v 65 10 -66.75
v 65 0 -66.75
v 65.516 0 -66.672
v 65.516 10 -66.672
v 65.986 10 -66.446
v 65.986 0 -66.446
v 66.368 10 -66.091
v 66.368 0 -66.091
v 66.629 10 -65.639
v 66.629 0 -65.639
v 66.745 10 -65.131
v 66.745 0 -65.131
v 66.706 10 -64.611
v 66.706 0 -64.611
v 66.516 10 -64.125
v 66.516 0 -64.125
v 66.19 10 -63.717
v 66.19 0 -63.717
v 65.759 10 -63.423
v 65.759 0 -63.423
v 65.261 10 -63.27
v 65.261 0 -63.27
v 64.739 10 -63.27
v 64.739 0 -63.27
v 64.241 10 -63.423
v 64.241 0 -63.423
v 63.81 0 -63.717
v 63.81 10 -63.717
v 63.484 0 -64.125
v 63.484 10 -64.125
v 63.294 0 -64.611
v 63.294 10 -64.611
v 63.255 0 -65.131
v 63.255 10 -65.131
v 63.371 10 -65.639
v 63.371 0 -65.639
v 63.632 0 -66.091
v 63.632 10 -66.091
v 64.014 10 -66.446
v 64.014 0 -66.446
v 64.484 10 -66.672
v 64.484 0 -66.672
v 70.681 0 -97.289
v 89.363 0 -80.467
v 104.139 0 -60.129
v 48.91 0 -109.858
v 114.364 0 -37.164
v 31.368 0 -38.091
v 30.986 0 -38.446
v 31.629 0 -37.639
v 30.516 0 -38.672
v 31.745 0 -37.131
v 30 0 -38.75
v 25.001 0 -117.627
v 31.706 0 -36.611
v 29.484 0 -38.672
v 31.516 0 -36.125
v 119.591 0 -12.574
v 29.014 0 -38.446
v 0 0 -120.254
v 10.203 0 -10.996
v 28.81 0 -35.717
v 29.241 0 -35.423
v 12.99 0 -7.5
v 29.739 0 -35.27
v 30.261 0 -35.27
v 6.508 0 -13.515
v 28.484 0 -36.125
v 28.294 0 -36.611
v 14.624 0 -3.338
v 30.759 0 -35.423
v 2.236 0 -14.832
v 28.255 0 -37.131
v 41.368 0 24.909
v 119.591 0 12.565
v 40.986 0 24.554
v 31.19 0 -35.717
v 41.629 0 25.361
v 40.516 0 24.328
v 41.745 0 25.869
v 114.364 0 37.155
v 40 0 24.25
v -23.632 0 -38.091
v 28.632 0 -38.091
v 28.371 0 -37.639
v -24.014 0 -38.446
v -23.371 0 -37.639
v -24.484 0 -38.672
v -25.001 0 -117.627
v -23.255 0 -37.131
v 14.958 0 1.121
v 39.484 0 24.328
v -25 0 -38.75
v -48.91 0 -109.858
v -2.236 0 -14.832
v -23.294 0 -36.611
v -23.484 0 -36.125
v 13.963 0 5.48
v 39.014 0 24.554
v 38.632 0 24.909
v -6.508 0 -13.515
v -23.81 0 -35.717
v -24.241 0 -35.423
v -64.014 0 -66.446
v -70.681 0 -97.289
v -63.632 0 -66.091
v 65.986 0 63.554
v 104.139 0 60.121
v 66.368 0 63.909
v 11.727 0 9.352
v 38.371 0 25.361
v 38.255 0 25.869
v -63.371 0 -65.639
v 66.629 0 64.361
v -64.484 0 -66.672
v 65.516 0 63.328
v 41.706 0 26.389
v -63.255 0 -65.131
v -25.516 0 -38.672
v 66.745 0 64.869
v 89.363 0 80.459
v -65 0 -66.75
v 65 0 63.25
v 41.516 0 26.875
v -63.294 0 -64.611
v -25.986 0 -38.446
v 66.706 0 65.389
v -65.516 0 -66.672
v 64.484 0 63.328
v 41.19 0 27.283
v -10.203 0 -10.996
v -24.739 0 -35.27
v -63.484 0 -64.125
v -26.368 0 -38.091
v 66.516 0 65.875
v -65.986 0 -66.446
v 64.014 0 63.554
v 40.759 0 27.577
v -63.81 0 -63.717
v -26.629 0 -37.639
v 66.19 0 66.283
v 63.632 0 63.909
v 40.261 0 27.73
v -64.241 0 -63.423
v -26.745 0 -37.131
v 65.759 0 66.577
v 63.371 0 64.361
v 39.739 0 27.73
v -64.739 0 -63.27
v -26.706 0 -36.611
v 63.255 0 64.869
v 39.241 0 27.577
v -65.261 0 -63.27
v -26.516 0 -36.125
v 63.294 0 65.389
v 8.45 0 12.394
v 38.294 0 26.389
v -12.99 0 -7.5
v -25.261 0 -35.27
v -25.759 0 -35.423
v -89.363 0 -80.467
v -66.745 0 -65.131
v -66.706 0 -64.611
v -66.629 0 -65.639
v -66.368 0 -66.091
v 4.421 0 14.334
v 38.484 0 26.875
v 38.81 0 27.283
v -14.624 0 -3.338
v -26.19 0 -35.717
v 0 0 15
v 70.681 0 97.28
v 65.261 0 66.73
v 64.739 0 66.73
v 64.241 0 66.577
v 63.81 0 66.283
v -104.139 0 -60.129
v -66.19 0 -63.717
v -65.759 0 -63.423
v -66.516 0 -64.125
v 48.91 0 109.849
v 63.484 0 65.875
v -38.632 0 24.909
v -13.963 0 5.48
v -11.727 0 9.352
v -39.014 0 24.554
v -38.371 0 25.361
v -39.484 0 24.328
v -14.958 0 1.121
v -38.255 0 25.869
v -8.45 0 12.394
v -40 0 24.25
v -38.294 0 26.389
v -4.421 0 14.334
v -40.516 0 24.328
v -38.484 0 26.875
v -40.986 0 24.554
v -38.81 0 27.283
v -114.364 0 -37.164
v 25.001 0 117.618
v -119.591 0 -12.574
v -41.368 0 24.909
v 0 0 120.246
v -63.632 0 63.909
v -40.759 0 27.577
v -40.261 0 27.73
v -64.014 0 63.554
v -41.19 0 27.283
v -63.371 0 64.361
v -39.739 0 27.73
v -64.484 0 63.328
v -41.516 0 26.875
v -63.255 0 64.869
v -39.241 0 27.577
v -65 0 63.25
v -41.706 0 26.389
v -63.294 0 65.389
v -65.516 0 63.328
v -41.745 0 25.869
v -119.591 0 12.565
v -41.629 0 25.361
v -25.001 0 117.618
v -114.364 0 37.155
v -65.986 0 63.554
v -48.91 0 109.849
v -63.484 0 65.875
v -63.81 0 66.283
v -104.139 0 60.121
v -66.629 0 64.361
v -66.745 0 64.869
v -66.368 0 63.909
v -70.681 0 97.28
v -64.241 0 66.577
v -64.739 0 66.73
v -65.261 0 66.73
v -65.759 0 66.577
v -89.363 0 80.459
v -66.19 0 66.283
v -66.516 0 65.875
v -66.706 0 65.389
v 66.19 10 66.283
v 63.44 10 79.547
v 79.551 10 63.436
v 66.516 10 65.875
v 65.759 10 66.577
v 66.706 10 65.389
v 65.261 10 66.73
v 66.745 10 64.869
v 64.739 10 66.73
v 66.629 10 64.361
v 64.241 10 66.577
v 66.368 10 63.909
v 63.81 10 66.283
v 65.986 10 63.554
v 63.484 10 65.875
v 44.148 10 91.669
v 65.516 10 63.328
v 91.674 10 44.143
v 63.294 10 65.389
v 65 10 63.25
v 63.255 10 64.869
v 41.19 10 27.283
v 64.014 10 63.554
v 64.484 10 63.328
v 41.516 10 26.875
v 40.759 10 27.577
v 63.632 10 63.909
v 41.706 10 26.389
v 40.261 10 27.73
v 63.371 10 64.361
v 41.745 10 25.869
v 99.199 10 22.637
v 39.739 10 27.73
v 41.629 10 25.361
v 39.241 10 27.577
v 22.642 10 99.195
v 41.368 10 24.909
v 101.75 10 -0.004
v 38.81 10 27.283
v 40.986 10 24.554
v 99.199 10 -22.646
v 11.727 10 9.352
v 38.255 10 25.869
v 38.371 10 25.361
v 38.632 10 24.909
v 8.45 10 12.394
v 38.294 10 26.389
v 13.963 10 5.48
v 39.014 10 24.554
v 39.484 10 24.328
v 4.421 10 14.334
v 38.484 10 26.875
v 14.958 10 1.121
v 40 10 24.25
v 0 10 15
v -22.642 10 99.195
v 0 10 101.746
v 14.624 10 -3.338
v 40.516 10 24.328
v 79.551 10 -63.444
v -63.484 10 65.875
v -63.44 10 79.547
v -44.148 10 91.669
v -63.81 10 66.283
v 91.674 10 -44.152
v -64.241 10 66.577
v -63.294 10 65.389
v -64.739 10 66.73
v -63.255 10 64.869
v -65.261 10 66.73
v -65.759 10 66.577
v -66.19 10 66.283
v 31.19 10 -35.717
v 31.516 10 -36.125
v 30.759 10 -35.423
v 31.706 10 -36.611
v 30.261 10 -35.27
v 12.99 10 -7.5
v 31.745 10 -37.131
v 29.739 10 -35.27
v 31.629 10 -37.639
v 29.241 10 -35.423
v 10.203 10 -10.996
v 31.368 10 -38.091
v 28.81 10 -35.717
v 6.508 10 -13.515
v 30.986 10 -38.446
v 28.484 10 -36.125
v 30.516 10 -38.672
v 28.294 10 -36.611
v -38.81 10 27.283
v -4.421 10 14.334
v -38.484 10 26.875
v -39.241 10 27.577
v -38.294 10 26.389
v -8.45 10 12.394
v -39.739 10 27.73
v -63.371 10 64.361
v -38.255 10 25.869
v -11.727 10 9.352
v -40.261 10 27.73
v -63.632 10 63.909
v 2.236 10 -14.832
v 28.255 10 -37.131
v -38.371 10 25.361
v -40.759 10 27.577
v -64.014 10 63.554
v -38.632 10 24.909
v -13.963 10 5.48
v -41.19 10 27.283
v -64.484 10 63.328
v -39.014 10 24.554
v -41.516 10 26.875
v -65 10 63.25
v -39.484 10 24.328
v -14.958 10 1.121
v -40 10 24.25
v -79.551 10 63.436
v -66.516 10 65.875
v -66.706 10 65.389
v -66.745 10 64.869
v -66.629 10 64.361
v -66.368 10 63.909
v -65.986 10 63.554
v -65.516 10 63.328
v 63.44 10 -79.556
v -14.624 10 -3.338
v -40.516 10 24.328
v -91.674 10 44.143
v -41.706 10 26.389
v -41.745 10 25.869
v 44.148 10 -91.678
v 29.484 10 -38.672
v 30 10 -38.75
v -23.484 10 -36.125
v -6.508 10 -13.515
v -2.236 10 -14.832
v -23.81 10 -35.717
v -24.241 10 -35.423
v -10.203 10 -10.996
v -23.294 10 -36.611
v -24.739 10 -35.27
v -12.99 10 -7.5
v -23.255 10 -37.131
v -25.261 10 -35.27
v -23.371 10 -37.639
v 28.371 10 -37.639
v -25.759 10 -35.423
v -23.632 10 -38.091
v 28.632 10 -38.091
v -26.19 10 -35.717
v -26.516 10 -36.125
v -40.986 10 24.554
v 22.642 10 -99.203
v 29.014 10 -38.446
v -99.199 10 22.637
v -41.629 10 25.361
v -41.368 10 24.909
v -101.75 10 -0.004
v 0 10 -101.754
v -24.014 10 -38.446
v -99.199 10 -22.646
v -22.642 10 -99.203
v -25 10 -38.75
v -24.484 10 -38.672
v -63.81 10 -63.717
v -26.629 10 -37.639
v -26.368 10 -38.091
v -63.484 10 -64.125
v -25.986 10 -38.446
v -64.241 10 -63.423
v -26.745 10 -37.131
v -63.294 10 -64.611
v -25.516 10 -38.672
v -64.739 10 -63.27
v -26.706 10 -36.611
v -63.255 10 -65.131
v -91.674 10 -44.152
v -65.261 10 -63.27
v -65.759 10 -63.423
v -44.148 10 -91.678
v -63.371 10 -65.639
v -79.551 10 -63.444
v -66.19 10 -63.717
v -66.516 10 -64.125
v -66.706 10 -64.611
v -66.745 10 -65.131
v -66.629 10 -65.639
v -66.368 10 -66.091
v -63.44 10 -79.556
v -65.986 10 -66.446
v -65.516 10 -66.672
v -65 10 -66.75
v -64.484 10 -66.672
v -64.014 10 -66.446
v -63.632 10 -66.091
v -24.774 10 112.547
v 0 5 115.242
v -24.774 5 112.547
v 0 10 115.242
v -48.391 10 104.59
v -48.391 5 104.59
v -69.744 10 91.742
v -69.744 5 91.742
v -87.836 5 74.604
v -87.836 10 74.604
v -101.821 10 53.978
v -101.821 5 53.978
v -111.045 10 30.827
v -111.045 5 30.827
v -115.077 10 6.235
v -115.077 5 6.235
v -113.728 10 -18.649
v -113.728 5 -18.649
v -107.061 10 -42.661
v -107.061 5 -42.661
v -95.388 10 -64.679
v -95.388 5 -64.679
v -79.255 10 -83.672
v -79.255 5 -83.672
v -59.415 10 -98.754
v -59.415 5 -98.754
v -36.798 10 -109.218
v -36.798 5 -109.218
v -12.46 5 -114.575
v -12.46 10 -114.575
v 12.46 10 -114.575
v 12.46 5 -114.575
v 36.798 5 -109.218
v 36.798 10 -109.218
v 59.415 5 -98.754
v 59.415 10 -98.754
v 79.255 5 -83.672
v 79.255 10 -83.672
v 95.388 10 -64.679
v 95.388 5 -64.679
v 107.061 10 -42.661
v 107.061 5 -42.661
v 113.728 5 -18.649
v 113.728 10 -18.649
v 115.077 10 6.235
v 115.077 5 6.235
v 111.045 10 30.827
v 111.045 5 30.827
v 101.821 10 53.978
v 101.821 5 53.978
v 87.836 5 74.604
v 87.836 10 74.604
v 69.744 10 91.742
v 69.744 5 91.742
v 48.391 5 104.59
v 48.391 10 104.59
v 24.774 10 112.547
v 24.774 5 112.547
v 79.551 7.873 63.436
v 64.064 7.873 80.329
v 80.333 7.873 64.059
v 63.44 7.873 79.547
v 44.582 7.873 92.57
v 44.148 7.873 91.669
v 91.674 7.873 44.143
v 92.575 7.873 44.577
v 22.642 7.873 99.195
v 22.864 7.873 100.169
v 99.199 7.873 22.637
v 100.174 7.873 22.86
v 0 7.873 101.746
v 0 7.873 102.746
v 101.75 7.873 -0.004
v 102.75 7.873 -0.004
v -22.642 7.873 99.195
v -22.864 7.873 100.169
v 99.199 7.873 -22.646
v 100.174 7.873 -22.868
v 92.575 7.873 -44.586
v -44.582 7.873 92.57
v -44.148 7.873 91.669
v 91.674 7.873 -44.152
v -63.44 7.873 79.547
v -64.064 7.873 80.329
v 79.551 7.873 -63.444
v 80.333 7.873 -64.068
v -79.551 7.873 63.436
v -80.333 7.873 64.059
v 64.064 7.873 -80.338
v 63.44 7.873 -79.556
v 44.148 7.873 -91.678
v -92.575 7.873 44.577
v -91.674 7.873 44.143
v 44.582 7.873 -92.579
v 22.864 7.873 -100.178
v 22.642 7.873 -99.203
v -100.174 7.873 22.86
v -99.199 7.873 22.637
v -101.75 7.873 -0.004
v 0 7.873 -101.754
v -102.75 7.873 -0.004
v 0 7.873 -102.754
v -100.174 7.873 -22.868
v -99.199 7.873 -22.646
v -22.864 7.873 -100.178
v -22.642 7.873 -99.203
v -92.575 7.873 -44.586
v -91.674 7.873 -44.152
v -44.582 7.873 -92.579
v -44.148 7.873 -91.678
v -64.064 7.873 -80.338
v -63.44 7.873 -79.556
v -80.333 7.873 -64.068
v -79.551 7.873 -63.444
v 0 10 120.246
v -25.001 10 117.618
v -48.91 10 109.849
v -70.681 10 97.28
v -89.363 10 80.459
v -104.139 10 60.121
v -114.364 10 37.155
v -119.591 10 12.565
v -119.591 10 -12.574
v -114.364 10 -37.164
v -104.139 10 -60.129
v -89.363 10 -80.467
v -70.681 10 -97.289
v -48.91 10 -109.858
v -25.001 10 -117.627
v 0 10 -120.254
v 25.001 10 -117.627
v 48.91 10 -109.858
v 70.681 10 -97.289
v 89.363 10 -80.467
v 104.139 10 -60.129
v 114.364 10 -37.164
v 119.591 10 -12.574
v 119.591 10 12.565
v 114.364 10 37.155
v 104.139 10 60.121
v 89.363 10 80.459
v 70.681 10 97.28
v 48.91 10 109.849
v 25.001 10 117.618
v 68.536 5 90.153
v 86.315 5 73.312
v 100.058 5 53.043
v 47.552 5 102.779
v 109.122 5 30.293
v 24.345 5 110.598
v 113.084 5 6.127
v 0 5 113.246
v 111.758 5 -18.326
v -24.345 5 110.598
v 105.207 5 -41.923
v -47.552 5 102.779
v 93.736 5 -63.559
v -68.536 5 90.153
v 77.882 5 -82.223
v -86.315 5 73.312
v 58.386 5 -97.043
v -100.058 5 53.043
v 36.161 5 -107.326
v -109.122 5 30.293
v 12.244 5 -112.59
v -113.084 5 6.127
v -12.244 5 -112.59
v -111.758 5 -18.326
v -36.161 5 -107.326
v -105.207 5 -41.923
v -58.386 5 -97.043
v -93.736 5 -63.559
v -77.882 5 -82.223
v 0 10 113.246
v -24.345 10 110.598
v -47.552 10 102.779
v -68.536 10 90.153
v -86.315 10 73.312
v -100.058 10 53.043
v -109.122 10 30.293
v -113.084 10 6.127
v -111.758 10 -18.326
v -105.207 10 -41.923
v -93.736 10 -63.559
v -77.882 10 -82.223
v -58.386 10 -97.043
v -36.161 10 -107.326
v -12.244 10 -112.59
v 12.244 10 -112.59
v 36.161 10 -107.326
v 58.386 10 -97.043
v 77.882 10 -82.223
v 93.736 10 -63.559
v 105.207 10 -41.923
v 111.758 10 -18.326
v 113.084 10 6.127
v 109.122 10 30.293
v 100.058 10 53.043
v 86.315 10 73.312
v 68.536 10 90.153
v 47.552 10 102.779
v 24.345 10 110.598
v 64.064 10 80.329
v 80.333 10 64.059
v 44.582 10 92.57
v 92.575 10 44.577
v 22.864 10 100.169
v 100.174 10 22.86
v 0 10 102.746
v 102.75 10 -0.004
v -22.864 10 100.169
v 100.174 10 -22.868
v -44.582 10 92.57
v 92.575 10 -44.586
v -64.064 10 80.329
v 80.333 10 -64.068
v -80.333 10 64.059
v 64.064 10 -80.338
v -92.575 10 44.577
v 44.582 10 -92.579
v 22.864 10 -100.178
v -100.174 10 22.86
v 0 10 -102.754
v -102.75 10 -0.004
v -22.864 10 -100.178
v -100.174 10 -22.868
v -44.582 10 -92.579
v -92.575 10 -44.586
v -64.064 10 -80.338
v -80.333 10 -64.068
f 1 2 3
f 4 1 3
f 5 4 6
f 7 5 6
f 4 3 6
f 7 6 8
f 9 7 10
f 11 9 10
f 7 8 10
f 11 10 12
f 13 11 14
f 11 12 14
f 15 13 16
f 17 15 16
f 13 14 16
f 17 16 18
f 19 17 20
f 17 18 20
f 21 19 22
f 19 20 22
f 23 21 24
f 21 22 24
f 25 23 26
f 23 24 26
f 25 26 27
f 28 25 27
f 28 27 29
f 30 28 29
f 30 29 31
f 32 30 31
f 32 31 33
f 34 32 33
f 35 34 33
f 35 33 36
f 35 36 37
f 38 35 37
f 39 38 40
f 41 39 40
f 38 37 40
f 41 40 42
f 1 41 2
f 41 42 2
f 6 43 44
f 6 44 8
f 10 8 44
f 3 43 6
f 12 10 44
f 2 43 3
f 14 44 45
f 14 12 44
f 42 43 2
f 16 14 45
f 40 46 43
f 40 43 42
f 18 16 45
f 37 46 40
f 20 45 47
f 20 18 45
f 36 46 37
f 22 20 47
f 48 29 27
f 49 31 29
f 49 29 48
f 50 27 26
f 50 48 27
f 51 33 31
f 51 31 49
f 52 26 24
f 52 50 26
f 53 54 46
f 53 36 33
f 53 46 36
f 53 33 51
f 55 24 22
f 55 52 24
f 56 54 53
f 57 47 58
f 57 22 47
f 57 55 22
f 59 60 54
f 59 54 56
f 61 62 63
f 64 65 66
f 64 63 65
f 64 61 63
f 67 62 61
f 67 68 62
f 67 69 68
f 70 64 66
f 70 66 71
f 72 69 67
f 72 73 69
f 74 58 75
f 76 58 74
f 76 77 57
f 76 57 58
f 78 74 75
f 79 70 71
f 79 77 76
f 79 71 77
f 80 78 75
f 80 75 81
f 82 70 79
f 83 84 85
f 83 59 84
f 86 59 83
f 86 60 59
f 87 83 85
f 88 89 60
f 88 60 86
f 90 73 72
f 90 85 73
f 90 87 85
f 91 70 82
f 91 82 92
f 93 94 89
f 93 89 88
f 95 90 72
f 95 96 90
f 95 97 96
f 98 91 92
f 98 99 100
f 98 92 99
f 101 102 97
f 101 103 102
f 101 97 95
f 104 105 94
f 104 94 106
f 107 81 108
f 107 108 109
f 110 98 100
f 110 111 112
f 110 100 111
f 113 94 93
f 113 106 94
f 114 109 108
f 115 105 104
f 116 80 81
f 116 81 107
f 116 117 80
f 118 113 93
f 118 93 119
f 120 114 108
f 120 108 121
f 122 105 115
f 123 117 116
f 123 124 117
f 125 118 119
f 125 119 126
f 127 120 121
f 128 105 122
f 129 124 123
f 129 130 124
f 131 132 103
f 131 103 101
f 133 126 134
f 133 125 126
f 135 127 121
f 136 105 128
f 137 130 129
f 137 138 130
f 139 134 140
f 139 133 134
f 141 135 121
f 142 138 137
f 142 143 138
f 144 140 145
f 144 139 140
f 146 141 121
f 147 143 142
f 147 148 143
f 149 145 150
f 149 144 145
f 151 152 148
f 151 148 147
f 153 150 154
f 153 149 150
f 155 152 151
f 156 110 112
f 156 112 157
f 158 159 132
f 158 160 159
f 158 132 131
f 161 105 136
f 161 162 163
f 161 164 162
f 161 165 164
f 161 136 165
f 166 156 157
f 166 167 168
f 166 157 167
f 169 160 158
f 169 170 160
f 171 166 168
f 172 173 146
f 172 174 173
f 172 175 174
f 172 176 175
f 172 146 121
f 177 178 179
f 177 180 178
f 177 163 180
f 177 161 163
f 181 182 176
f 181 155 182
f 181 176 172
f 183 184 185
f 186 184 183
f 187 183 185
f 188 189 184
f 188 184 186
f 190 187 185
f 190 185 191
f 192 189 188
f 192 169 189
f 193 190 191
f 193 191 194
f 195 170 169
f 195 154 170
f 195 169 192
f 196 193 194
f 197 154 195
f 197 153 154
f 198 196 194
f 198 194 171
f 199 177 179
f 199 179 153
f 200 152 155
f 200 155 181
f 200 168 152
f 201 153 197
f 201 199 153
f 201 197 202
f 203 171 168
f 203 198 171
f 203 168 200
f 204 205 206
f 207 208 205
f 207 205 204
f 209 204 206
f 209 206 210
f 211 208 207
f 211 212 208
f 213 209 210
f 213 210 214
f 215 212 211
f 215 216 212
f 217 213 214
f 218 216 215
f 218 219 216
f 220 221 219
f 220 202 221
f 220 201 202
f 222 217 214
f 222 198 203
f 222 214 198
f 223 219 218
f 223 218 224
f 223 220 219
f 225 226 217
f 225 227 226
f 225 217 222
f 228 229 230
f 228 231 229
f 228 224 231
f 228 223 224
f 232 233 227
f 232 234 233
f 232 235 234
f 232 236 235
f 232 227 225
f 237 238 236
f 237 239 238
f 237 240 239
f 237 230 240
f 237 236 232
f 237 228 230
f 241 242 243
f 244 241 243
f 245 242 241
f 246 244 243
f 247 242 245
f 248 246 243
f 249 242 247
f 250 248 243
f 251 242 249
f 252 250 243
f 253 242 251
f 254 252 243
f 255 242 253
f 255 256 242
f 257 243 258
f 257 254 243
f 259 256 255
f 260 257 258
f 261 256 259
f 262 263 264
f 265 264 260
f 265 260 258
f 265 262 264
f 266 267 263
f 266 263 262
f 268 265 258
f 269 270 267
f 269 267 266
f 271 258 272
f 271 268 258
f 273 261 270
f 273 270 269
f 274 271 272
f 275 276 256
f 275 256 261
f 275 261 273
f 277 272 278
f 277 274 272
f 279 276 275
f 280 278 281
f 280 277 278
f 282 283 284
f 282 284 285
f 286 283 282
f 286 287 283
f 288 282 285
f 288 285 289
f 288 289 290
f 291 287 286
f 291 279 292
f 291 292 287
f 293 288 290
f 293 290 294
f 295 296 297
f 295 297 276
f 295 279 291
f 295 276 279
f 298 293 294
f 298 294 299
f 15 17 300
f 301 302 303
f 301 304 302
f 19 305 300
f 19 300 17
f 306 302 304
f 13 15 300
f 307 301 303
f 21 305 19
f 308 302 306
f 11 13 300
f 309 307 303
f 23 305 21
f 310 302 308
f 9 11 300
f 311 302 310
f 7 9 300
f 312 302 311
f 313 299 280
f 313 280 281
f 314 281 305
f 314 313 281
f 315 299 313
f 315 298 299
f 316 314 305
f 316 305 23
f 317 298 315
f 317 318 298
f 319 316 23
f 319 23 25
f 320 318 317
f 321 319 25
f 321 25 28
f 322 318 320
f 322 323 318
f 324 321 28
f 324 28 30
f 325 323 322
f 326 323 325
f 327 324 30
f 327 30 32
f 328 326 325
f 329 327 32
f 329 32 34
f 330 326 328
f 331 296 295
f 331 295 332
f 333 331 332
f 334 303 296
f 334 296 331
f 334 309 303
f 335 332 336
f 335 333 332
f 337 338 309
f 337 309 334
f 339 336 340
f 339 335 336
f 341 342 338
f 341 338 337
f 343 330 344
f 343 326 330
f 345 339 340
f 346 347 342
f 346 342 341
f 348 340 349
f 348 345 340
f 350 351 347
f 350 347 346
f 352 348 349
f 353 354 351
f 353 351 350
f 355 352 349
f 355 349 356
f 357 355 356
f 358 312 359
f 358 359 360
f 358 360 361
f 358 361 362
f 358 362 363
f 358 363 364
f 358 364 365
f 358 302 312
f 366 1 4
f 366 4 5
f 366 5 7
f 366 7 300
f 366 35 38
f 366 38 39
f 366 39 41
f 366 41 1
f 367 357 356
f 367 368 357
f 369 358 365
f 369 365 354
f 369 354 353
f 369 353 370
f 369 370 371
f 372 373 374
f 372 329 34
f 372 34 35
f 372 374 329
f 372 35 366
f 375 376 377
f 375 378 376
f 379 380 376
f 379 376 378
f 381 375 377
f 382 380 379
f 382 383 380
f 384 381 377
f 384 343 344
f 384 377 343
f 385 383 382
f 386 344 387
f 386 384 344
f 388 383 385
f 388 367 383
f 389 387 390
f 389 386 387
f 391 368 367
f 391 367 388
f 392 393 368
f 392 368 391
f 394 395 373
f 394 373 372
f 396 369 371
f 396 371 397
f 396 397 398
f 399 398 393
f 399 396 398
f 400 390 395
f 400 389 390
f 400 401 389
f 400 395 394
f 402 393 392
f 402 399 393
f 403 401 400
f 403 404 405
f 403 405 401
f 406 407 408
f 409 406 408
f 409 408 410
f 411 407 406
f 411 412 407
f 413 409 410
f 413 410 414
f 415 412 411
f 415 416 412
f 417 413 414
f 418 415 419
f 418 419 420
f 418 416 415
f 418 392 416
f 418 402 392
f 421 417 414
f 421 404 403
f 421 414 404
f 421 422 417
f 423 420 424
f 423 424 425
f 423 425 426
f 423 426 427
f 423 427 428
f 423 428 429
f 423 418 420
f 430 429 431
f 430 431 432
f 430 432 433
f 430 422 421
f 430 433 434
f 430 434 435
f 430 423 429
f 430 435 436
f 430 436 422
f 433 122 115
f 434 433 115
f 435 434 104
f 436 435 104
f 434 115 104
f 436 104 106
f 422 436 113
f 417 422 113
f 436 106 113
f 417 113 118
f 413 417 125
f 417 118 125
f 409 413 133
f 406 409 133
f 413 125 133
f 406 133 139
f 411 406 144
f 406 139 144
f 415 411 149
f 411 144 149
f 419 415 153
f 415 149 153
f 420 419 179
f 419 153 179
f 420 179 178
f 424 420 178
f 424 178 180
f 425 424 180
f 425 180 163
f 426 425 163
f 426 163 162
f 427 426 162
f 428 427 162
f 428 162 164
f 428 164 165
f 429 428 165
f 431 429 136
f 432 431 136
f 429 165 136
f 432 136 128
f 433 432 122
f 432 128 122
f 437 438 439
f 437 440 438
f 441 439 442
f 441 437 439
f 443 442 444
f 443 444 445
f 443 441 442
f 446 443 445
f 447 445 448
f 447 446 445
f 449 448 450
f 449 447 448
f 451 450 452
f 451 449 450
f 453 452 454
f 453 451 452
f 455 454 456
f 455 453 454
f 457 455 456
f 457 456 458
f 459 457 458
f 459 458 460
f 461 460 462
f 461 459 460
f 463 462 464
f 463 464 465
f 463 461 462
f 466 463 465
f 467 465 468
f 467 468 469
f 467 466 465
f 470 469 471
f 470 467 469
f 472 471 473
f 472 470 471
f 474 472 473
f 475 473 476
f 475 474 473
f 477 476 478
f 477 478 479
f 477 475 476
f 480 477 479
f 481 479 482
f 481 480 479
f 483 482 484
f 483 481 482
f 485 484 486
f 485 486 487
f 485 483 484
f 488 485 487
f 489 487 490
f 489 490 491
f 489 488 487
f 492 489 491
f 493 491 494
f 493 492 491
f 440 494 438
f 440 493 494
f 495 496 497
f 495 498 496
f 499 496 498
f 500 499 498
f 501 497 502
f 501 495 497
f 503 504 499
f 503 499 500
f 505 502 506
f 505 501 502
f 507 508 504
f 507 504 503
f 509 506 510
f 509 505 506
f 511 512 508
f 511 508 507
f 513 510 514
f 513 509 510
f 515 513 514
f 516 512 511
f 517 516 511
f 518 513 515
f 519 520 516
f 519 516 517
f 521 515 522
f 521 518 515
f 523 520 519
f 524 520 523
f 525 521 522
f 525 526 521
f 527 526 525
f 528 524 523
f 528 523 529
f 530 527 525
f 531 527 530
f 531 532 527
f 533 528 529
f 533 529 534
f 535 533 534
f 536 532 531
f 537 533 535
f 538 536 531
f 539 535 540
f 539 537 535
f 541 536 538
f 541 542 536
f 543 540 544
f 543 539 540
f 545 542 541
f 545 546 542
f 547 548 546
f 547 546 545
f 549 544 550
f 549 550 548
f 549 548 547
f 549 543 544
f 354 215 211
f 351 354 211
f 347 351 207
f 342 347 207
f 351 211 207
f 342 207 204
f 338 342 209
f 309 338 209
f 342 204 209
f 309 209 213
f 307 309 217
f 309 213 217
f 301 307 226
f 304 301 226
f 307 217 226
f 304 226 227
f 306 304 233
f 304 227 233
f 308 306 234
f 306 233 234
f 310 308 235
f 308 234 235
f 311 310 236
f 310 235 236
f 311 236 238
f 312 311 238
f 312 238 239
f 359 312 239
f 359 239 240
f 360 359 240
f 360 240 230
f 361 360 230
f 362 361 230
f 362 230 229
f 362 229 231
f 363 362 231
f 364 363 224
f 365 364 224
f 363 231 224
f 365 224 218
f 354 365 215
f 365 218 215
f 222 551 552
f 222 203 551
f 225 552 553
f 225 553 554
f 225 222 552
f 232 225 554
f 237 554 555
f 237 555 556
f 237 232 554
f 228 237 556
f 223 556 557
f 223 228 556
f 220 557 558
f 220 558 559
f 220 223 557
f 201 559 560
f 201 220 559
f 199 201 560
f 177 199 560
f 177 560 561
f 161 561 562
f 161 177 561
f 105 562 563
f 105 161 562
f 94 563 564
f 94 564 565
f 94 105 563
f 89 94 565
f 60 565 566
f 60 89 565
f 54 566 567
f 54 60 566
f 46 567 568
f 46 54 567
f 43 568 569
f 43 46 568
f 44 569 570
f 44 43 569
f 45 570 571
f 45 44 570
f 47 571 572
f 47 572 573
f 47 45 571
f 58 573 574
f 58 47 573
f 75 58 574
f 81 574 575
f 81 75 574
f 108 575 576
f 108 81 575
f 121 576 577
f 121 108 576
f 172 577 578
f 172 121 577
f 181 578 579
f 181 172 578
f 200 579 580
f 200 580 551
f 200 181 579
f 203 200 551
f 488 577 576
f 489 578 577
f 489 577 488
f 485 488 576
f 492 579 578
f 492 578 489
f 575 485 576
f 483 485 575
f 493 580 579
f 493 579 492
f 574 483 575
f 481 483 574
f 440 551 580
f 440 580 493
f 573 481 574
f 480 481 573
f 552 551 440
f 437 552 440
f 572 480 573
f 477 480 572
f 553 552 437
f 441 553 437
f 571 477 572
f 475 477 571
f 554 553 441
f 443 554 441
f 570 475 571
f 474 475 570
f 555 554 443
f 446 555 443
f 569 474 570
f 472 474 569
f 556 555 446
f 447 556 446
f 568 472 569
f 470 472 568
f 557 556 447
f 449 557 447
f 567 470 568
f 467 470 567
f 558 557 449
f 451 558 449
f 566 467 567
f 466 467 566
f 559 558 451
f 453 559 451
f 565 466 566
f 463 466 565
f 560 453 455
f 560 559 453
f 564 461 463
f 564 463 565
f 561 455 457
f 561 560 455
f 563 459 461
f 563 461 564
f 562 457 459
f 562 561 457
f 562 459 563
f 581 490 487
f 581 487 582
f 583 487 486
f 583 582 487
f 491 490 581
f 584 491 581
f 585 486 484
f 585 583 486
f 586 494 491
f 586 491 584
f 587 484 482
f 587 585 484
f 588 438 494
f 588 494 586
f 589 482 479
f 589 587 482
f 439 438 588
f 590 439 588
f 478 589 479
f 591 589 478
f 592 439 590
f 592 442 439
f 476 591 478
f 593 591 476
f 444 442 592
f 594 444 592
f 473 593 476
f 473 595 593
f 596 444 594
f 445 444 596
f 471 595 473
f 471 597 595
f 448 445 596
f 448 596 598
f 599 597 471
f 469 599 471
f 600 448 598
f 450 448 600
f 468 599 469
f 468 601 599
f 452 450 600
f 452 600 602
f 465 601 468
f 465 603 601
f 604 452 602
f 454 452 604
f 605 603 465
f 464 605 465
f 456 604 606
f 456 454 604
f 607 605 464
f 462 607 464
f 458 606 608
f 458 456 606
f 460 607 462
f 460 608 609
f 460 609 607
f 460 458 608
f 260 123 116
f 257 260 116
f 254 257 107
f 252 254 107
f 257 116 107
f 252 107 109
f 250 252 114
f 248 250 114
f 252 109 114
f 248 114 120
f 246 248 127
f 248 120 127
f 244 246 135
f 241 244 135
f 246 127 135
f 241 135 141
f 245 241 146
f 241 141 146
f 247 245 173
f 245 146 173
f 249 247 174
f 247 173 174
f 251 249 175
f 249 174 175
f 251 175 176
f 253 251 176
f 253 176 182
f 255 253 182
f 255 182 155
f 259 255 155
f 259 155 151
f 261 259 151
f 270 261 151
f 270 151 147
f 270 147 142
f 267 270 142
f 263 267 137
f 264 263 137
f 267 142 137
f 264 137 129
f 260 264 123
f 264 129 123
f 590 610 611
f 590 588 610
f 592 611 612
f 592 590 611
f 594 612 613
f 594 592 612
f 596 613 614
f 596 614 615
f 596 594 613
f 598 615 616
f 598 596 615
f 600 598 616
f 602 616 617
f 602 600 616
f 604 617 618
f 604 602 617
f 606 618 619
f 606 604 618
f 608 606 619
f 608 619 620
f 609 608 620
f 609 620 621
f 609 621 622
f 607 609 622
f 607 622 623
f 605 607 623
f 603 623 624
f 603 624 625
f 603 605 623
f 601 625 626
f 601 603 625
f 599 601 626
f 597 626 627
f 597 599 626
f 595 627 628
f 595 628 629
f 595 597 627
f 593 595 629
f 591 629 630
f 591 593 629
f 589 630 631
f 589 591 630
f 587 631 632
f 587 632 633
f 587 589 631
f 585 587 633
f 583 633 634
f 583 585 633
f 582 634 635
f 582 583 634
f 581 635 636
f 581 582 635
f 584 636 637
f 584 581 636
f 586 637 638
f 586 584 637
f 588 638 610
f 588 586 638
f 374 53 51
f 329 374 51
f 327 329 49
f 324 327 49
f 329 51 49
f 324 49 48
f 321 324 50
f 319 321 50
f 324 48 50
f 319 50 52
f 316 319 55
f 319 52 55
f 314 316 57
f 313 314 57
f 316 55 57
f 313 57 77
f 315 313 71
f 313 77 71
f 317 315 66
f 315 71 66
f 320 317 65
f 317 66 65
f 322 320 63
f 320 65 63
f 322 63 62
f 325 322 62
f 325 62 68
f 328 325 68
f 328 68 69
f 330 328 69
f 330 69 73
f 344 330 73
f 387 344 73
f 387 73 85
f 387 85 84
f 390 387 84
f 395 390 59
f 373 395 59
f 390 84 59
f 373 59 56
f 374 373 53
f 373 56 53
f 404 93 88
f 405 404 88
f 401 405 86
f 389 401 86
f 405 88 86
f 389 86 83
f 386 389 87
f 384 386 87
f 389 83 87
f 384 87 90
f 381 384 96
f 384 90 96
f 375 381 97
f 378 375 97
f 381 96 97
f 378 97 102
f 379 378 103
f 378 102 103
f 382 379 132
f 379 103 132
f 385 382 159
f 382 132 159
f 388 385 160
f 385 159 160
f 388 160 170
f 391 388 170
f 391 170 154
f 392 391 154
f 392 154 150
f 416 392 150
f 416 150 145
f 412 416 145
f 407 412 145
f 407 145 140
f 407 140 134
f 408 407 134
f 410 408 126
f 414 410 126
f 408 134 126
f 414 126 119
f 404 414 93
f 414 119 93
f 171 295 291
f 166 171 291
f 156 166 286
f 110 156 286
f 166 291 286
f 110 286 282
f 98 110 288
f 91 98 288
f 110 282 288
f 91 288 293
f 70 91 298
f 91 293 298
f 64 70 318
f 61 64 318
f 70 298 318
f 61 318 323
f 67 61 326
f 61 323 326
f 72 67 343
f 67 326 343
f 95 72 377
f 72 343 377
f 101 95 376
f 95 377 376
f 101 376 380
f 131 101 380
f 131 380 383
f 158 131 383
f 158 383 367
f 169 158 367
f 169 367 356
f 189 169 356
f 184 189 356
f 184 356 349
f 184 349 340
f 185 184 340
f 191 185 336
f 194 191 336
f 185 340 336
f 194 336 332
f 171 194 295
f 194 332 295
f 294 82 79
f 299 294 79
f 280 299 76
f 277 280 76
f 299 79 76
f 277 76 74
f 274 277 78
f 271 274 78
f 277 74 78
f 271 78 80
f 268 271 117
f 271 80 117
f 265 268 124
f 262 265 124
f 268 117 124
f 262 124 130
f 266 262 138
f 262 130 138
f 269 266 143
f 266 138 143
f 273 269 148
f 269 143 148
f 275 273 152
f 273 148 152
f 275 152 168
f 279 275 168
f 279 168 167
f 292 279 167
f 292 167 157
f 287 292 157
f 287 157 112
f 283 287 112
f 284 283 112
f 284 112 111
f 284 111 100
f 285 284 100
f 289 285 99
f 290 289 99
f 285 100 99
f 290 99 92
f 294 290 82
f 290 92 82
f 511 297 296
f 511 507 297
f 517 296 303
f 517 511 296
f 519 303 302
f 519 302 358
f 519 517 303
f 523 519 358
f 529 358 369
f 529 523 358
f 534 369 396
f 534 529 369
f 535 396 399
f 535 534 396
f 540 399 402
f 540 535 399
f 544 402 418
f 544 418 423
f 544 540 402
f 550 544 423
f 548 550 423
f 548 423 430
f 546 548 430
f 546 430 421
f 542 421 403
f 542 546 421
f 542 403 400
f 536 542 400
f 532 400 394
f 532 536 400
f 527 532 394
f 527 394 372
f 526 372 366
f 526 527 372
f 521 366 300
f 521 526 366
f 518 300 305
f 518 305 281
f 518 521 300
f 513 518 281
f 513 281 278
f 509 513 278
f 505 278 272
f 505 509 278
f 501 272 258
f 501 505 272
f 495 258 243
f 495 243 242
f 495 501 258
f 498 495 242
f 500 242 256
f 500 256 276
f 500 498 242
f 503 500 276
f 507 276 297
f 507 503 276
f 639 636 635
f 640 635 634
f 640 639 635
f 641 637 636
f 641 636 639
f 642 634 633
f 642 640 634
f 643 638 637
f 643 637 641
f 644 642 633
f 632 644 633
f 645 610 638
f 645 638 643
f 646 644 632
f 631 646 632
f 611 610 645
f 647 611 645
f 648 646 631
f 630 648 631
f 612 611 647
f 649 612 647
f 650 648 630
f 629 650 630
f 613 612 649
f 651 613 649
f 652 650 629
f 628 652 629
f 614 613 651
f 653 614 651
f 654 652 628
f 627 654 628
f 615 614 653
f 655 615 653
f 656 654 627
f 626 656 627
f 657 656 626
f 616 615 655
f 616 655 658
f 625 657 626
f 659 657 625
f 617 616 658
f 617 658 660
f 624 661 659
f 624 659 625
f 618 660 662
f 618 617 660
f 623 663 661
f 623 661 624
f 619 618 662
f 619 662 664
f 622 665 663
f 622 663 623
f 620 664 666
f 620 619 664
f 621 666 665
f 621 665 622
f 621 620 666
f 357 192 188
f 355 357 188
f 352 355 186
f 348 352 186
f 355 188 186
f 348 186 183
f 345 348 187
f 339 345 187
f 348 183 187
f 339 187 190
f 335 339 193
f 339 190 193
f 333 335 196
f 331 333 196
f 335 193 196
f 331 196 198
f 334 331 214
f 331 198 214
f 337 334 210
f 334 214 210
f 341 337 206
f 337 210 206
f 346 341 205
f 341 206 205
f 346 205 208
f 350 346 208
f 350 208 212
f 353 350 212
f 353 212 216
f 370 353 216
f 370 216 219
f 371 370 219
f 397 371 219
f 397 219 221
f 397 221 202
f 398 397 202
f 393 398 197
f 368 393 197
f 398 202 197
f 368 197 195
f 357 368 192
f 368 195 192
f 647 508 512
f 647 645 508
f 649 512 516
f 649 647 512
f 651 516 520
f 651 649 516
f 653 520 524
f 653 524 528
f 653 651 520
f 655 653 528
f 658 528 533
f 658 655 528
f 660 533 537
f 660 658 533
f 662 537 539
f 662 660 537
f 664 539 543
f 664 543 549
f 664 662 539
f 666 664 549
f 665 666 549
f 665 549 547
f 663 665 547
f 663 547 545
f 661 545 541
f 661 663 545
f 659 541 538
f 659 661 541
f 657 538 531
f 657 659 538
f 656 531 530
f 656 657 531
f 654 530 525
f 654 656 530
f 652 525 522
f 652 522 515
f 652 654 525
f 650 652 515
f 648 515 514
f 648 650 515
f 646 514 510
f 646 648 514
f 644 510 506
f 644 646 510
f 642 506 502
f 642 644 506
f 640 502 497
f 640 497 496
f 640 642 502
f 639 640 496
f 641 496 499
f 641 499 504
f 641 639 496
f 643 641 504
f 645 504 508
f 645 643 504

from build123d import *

# Parameters (mm, degrees)
ESQUISSE3_R             = 15
ENL_V_MAT_EXTRU_1_DEPTH = 10
ESQUISSE4_R             = 1.75
ENL_V_MAT_EXTRU_2_DEPTH = 10
ESQUISSE5_R             = 1.75
ENL_V_MAT_EXTRU_3_DEPTH = 10


with BuildPart() as part:
    # Esquisse1 → Révolution1 (revolve)
    with BuildSketch(Plane(origin=(0, 0, 0), x_dir=(0, 0, -1), z_dir=(1, 0, 0)), mode=Mode.PRIVATE) as r_volution1_sk:
        Polygon((101.754375518, 10), (101.754375518, 7.872703136), (102.754375518, 7.872703136), (102.754375518, 10), (113.254375518, 10), (113.254375518, 5), (115.25030387, 5), (115.25030387, 10), (120.254297163, 10), (120.254297163, 0), (0.004375518, 0), (0.004375518, 10), align=None)
    revolve(r_volution1_sk.sketch.rotate(Axis((0, 10, -0.004375518), (0, -1, 0)), 180), axis=Axis((0, 10, -0.004375518), (0, -1, 0)))

    # Esquisse3 → Enlèv. mat.-Extru.1 (cut)
    with BuildSketch(Plane(origin=(0, 10, 0), x_dir=(1, 0, 0), z_dir=(0, 1, 0))):
        with Locations(Location((0, 0, 0), (0, 0, 270))):
            Circle(ESQUISSE3_R)
    extrude(amount=-ENL_V_MAT_EXTRU_1_DEPTH, mode=Mode.SUBTRACT)

    # Esquisse4 → Enlèv. mat.-Extru.2 (cut)
    with BuildSketch(Plane.XZ):
        with Locations(Location((-25, -37, 0), (0, 0, 270))):
            Circle(ESQUISSE4_R)
        with Locations(Location((-40, 26, 0), (0, 0, 270))):
            Circle(ESQUISSE4_R)
        with Locations(Location((40, 26, 0), (0, 0, 270))):
            Circle(ESQUISSE4_R)
        with Locations(Location((30, -37, 0), (0, 0, 270))):
            Circle(ESQUISSE4_R)
    extrude(amount=-ENL_V_MAT_EXTRU_2_DEPTH, mode=Mode.SUBTRACT)

    # Esquisse5 → Enlèv. mat.-Extru.3 (cut)
    with BuildSketch(Plane.XZ):
        with Locations(Location((-65, 65, 0), (0, 0, 270))):
            Circle(ESQUISSE5_R)
        with Locations(Location((-65, -65, 0), (0, 0, 270))):
            Circle(ESQUISSE5_R)
        with Locations(Location((65, 65, 0), (0, 0, 270))):
            Circle(ESQUISSE5_R)
        with Locations(Location((65, -65, 0), (0, 0, 270))):
            Circle(ESQUISSE5_R)
    extrude(amount=-ENL_V_MAT_EXTRU_3_DEPTH, mode=Mode.SUBTRACT)


solid = part.part
